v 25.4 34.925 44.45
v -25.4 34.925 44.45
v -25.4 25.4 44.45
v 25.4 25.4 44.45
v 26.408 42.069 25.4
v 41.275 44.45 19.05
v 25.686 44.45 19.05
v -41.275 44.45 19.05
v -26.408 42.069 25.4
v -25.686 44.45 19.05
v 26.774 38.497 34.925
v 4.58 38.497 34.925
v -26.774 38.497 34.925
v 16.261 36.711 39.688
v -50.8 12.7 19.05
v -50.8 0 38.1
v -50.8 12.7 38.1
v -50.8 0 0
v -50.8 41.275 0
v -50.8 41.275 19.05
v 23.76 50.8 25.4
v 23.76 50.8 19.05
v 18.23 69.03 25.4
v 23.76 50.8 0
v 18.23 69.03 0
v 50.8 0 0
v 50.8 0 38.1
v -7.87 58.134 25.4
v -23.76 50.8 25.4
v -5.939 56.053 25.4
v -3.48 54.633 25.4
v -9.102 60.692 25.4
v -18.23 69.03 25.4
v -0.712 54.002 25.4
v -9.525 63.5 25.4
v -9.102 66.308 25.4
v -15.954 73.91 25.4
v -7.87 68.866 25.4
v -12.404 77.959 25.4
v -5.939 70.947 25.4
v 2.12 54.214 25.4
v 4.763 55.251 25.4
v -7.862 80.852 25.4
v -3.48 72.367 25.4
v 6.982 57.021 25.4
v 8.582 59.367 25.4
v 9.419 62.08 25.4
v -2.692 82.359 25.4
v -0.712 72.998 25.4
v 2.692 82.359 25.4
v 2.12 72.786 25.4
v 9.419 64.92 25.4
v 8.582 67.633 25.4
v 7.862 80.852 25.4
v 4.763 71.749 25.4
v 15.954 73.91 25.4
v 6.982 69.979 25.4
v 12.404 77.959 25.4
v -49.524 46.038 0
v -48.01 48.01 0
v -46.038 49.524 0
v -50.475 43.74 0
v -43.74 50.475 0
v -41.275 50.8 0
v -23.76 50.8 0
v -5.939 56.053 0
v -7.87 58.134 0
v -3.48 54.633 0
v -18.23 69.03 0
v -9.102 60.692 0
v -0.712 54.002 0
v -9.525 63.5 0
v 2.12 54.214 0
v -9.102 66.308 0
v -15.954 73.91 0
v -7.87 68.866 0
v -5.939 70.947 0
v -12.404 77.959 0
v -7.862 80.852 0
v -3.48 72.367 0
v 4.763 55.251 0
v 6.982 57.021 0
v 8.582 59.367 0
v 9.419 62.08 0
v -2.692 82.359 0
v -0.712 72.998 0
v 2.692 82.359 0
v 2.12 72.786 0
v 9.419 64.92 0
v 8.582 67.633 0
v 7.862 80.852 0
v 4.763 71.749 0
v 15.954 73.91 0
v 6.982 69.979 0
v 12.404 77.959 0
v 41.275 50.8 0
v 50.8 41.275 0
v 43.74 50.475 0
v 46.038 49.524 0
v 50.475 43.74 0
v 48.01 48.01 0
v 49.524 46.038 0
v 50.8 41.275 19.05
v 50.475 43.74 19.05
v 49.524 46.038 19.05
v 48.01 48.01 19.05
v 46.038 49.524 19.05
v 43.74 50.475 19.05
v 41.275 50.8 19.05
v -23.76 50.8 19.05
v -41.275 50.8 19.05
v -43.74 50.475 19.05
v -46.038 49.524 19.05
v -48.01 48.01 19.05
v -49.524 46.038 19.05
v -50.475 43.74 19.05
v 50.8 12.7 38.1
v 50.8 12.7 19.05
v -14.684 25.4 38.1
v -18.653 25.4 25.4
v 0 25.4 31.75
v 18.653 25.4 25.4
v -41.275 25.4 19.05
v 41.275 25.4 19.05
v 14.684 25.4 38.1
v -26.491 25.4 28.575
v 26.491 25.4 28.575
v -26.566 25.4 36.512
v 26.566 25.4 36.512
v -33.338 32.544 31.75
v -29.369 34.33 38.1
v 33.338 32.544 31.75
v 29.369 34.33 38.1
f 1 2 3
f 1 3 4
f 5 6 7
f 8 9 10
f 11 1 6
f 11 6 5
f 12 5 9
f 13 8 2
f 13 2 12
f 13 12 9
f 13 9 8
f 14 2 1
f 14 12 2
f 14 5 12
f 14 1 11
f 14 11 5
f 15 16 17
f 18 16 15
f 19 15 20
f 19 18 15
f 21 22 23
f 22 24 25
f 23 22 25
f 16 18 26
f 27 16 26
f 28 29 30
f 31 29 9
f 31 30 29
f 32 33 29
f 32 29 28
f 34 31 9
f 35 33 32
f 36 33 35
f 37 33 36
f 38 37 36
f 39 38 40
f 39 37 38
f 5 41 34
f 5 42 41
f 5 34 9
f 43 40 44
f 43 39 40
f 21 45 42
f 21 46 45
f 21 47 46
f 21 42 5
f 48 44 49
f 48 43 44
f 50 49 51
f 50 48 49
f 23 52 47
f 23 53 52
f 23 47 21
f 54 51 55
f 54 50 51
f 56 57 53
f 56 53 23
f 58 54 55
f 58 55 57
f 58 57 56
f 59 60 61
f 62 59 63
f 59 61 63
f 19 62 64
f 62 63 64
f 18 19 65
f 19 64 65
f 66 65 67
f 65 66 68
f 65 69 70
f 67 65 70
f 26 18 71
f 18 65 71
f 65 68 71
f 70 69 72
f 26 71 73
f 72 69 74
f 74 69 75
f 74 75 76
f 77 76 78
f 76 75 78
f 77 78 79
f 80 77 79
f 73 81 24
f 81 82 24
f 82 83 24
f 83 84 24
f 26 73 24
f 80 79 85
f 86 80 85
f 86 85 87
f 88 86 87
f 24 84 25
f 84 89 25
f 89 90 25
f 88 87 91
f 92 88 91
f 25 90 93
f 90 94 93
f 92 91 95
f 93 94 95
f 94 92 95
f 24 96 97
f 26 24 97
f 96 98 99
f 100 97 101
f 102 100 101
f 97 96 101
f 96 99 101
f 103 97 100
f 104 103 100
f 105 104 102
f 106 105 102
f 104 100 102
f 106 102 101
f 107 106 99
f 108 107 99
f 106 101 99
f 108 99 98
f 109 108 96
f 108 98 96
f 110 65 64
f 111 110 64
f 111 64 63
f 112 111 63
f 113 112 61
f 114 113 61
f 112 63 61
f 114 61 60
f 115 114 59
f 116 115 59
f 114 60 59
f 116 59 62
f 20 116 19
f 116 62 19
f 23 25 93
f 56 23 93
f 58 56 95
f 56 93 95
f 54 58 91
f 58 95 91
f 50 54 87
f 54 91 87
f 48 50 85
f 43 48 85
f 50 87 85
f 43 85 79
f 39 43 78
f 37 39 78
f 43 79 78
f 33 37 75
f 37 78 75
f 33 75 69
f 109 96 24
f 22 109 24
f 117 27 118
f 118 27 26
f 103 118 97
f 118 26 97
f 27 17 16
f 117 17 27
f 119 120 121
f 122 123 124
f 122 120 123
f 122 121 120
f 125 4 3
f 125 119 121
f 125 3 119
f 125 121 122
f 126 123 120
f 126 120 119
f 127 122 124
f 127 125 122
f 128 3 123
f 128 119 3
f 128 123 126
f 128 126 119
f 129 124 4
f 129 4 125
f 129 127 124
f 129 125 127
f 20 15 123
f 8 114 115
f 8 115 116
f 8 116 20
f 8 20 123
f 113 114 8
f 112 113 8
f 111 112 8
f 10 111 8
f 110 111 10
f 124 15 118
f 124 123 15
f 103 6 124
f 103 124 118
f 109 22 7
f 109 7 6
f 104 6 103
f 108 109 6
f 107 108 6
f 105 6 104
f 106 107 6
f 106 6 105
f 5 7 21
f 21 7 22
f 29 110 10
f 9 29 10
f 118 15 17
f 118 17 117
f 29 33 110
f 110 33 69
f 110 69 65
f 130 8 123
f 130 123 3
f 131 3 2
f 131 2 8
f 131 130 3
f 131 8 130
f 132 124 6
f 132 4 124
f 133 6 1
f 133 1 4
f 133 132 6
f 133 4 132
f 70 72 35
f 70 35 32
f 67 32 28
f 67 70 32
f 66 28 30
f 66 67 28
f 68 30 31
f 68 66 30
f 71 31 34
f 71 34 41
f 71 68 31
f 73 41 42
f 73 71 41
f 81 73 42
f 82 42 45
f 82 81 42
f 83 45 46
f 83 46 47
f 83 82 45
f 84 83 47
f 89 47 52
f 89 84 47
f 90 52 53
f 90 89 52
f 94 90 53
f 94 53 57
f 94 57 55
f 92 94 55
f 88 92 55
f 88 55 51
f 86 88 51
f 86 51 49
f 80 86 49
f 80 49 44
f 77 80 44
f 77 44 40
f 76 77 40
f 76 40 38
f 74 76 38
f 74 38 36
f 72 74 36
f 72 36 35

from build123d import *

# Parameters (mm, degrees)
SKETCH1_R           = 9.525
BOSS_EXTRUDE1_DEPTH = 19.05
SKETCH1_3_R         = 9.525
BOSS_EXTRUDE2_DEPTH = 25.4
SKETCH1_4_W         = 101.6
SKETCH1_4_H         = 12.7
BOSS_EXTRUDE3_DEPTH = 38.1


with BuildPart() as part:
    # Sketch1 → Boss-Extrude1 (new body)
    with BuildSketch(Plane.XY):
        with BuildLine():
            Line((-50.8, 41.275), (-50.8, 12.7))
            Line((-50.8, 12.7), (50.8, 12.7))
            Line((50.8, 12.7), (50.8, 41.275))
            ThreePointArc((50.8, 41.275), (48.010192091, 48.010192091), (41.275, 50.8))
            Line((41.275, 50.8), (23.759524406, 50.8))
            Line((23.759524406, 50.8), (18.229762203, 69.029762203))
            ThreePointArc((18.229762203, 69.029762203), (0, 82.55), (-18.229762203, 69.029762203))
            Line((-18.229762203, 69.029762203), (-23.759524406, 50.8))
            Line((-23.759524406, 50.8), (-41.275, 50.8))
            ThreePointArc((-41.275, 50.8), (-48.010192091, 48.010192091), (-50.8, 41.275))
        make_face()
        with Locations((0, 63.5)):
            Circle(SKETCH1_R, mode=Mode.SUBTRACT)
    extrude(amount=BOSS_EXTRUDE1_DEPTH)

    # Sketch1<3> → Boss-Extrude2 (add)
    with BuildSketch(Plane.XY):
        with BuildLine():
            Line((-18.229762203, 69.029762203), (-28.575, 34.925))
            Line((-28.575, 34.925), (28.575, 34.925))
            Line((28.575, 34.925), (18.229762203, 69.029762203))
            ThreePointArc((18.229762203, 69.029762203), (0, 82.55), (-18.229762203, 69.029762203))
        make_face()
        with Locations((0, 63.5)):
            Circle(SKETCH1_3_R, mode=Mode.SUBTRACT)
    extrude(amount=BOSS_EXTRUDE2_DEPTH)

    # Sketch1<4> → Boss-Extrude3 (add)
    with BuildSketch(Plane.XY):
        with Locations((0, 6.35)):
            Rectangle(SKETCH1_4_W, SKETCH1_4_H)
    extrude(amount=BOSS_EXTRUDE3_DEPTH)

    # Sketch2 → Loft1 section 0
    with BuildSketch(Plane.XY.offset(19.05)):
        with BuildLine():
            Line((-41.275, 44.45), (41.275, 44.45))
            Line((41.275, 44.45), (41.275, 25.4))
            Line((41.275, 25.4), (-41.275, 25.4))
            Line((-41.275, 25.4), (-41.275, 44.45))
        make_face()
    # Sketch3 → Loft1 section 1
    with BuildSketch(Plane.XY.offset(44.45)):
        with BuildLine():
            Line((-25.4, 25.4), (25.4, 25.4))
            Line((25.4, 25.4), (25.4, 34.925))
            Line((25.4, 34.925), (-25.4, 34.925))
            Line((-25.4, 34.925), (-25.4, 25.4))
        make_face()
    loft()


solid = part.part
